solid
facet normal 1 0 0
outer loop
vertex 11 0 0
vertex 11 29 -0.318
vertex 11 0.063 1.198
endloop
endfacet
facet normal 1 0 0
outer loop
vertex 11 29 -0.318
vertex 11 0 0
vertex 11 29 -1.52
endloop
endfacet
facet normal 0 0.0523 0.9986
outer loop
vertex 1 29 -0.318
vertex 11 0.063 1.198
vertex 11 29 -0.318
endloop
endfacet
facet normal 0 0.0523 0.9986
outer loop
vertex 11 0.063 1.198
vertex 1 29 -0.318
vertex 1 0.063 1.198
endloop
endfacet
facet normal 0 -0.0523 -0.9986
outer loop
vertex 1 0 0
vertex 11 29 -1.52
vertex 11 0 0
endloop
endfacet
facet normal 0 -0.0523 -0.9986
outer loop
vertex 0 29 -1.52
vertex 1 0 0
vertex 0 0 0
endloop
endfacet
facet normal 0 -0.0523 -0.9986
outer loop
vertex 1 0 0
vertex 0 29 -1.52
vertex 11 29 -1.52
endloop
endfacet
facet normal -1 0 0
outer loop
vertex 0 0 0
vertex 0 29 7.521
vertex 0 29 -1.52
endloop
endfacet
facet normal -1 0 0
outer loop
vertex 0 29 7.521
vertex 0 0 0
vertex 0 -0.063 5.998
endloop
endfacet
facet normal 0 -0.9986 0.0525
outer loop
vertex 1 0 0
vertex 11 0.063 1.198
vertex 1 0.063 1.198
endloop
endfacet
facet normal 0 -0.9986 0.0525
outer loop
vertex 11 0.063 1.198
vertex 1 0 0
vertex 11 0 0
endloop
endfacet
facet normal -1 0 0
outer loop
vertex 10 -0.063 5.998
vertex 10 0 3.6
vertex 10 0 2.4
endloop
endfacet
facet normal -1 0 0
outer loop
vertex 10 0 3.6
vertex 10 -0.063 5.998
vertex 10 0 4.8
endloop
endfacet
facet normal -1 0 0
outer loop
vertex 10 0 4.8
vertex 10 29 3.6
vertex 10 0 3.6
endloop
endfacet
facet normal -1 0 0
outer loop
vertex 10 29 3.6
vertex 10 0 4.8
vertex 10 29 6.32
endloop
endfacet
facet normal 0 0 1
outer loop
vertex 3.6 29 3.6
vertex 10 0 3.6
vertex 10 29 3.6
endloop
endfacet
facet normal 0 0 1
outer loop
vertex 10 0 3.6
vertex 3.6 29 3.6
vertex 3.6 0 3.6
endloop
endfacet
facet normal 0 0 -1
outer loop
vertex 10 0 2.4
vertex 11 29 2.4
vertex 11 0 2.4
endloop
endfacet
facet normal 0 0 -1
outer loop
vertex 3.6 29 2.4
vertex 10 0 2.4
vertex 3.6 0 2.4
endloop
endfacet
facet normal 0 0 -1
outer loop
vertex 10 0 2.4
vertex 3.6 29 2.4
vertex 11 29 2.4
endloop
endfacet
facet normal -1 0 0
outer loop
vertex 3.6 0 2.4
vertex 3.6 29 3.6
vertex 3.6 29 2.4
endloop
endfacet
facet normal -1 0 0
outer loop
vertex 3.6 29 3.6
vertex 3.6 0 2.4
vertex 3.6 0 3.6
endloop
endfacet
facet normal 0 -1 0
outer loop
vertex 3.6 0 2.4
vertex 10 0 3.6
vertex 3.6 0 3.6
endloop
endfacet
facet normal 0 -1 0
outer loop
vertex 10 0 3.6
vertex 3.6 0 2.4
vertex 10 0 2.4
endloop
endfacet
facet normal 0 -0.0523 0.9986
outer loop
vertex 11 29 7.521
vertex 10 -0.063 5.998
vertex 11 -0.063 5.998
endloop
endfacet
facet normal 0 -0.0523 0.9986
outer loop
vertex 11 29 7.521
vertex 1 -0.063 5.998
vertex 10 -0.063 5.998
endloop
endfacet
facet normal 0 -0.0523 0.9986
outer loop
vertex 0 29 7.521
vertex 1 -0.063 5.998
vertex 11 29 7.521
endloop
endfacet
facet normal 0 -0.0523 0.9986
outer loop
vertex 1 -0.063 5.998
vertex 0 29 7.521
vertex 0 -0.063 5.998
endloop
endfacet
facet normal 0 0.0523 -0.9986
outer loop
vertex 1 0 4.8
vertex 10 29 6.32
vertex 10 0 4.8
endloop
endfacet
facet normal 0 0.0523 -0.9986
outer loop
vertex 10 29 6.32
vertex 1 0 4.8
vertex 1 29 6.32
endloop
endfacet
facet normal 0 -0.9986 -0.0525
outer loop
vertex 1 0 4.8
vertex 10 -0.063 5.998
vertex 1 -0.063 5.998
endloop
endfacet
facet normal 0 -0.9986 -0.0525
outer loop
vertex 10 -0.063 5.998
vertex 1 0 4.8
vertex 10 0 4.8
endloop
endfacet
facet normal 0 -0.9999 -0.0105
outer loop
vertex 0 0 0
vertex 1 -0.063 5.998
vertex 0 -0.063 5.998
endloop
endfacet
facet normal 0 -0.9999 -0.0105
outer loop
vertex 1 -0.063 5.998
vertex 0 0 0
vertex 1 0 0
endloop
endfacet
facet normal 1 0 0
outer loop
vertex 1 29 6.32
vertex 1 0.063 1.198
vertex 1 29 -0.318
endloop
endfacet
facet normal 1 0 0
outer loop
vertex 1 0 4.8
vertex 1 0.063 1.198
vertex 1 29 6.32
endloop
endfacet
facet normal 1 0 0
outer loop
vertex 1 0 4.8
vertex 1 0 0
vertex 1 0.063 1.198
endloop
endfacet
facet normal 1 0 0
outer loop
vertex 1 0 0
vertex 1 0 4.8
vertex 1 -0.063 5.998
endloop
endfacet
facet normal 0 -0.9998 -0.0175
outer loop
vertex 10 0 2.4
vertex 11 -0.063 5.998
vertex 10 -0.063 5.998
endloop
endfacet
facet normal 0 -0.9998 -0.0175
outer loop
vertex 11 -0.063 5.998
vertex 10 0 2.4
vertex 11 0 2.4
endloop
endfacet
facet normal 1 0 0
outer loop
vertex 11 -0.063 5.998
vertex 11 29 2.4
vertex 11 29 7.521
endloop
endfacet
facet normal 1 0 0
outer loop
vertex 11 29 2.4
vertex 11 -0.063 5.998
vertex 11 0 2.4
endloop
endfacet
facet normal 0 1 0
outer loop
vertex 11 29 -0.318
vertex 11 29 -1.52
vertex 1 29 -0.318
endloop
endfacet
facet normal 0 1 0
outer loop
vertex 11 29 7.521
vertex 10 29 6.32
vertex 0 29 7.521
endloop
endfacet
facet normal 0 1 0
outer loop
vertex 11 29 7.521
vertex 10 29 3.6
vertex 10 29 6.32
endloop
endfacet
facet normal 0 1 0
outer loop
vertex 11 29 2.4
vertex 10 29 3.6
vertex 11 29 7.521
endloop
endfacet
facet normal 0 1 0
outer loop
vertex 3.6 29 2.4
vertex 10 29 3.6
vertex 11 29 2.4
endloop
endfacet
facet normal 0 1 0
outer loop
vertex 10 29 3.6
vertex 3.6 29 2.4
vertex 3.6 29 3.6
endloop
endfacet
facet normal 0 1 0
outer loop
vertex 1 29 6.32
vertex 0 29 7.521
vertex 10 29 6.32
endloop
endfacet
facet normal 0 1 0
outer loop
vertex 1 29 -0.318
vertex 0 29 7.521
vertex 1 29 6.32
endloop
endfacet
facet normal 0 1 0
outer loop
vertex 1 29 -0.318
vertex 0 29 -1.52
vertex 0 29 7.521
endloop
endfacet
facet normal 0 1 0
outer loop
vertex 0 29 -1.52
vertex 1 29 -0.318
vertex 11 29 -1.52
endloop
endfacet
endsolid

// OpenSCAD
$fn=100;

module folder(){
    
    difference(){
        
    union(){
    z = 1.2;
    
    rotate([-3,0,0]) cube([10+1,30,z]);
    
    translate([3*z,0,z*2]) rotate([0,0,0]) cube([10 - 3* z,30,z]);
    
    translate([0,0,z*4]) rotate([3,0,0]) cube([10,30,z]);



    hull(){
        rotate([-3,0,0]) cube([1,30,z]);
        translate([0,0,z*4]) rotate([3,0,0]) cube([1,30,z]);
    }

    translate([10,0,0])
    hull(){
    translate([0,0,z*2]) rotate([0,0,0]) cube([1,30,z]);
    translate([0,0,z*4]) rotate([3,0,0]) cube([1,30,z]);
    }
    }
    
    translate([0,29,-5]) cube([20,20,20]);
}


}

folder();

//module spool_holder() {
//
//  d = 6.2;
//   h = 75;
//   l = 120;
////   part 1
//    difference(){
//    union(){
//        translate([0,0,0]) cube([l-5,10,5], center=true); 
//   
//        
//        translate([-l/2+d,0,0]) cylinder(d1=d+1,d2=d-2,h=h);
//        translate([l/2-d,0,0]) cylinder(d1=d+1,d2=d-2,h=h);
//        
//        
//        translate([0,0,0]) cylinder(d=3*d,h=5, center=true);
//        
//        translate([-l/2+d,0,0]) cylinder(d=3*d,h=5, center=true);
//   
//        translate([l/2-d,0,0]) cylinder(d=3*d,h=5, center=true);
//    }
//   translate([0,0,0]) cylinder(d=d,h=5, center=true);
//
//}

// part 2

//translate([0,0,0]) rotate([0,90,0]){
//    union(){
//   translate([0,0,2.5+2]) cylinder(d1=d+1.4,d2=d-1,h=h);
//   translate([0,0,-2.5])  cylinder(d1=d-1.4,d2=d+1.4, h=7);
//    }
//}


//rotate([0,-90,0])
//difference(){
//  ll = 200;
//  ww = 8;
//  cylinder(d=ww,h=ll, $fn=3);
//      
//      
//    for ( i = [1:20:ll-20]) {
//      translate([ww/2+1,ww/2,i+20]) rotate([90,0,0])
//      cylinder(d=ww,h=ww, $fn=50);
//    }
//}
//}
//
//
//spool_holder();
